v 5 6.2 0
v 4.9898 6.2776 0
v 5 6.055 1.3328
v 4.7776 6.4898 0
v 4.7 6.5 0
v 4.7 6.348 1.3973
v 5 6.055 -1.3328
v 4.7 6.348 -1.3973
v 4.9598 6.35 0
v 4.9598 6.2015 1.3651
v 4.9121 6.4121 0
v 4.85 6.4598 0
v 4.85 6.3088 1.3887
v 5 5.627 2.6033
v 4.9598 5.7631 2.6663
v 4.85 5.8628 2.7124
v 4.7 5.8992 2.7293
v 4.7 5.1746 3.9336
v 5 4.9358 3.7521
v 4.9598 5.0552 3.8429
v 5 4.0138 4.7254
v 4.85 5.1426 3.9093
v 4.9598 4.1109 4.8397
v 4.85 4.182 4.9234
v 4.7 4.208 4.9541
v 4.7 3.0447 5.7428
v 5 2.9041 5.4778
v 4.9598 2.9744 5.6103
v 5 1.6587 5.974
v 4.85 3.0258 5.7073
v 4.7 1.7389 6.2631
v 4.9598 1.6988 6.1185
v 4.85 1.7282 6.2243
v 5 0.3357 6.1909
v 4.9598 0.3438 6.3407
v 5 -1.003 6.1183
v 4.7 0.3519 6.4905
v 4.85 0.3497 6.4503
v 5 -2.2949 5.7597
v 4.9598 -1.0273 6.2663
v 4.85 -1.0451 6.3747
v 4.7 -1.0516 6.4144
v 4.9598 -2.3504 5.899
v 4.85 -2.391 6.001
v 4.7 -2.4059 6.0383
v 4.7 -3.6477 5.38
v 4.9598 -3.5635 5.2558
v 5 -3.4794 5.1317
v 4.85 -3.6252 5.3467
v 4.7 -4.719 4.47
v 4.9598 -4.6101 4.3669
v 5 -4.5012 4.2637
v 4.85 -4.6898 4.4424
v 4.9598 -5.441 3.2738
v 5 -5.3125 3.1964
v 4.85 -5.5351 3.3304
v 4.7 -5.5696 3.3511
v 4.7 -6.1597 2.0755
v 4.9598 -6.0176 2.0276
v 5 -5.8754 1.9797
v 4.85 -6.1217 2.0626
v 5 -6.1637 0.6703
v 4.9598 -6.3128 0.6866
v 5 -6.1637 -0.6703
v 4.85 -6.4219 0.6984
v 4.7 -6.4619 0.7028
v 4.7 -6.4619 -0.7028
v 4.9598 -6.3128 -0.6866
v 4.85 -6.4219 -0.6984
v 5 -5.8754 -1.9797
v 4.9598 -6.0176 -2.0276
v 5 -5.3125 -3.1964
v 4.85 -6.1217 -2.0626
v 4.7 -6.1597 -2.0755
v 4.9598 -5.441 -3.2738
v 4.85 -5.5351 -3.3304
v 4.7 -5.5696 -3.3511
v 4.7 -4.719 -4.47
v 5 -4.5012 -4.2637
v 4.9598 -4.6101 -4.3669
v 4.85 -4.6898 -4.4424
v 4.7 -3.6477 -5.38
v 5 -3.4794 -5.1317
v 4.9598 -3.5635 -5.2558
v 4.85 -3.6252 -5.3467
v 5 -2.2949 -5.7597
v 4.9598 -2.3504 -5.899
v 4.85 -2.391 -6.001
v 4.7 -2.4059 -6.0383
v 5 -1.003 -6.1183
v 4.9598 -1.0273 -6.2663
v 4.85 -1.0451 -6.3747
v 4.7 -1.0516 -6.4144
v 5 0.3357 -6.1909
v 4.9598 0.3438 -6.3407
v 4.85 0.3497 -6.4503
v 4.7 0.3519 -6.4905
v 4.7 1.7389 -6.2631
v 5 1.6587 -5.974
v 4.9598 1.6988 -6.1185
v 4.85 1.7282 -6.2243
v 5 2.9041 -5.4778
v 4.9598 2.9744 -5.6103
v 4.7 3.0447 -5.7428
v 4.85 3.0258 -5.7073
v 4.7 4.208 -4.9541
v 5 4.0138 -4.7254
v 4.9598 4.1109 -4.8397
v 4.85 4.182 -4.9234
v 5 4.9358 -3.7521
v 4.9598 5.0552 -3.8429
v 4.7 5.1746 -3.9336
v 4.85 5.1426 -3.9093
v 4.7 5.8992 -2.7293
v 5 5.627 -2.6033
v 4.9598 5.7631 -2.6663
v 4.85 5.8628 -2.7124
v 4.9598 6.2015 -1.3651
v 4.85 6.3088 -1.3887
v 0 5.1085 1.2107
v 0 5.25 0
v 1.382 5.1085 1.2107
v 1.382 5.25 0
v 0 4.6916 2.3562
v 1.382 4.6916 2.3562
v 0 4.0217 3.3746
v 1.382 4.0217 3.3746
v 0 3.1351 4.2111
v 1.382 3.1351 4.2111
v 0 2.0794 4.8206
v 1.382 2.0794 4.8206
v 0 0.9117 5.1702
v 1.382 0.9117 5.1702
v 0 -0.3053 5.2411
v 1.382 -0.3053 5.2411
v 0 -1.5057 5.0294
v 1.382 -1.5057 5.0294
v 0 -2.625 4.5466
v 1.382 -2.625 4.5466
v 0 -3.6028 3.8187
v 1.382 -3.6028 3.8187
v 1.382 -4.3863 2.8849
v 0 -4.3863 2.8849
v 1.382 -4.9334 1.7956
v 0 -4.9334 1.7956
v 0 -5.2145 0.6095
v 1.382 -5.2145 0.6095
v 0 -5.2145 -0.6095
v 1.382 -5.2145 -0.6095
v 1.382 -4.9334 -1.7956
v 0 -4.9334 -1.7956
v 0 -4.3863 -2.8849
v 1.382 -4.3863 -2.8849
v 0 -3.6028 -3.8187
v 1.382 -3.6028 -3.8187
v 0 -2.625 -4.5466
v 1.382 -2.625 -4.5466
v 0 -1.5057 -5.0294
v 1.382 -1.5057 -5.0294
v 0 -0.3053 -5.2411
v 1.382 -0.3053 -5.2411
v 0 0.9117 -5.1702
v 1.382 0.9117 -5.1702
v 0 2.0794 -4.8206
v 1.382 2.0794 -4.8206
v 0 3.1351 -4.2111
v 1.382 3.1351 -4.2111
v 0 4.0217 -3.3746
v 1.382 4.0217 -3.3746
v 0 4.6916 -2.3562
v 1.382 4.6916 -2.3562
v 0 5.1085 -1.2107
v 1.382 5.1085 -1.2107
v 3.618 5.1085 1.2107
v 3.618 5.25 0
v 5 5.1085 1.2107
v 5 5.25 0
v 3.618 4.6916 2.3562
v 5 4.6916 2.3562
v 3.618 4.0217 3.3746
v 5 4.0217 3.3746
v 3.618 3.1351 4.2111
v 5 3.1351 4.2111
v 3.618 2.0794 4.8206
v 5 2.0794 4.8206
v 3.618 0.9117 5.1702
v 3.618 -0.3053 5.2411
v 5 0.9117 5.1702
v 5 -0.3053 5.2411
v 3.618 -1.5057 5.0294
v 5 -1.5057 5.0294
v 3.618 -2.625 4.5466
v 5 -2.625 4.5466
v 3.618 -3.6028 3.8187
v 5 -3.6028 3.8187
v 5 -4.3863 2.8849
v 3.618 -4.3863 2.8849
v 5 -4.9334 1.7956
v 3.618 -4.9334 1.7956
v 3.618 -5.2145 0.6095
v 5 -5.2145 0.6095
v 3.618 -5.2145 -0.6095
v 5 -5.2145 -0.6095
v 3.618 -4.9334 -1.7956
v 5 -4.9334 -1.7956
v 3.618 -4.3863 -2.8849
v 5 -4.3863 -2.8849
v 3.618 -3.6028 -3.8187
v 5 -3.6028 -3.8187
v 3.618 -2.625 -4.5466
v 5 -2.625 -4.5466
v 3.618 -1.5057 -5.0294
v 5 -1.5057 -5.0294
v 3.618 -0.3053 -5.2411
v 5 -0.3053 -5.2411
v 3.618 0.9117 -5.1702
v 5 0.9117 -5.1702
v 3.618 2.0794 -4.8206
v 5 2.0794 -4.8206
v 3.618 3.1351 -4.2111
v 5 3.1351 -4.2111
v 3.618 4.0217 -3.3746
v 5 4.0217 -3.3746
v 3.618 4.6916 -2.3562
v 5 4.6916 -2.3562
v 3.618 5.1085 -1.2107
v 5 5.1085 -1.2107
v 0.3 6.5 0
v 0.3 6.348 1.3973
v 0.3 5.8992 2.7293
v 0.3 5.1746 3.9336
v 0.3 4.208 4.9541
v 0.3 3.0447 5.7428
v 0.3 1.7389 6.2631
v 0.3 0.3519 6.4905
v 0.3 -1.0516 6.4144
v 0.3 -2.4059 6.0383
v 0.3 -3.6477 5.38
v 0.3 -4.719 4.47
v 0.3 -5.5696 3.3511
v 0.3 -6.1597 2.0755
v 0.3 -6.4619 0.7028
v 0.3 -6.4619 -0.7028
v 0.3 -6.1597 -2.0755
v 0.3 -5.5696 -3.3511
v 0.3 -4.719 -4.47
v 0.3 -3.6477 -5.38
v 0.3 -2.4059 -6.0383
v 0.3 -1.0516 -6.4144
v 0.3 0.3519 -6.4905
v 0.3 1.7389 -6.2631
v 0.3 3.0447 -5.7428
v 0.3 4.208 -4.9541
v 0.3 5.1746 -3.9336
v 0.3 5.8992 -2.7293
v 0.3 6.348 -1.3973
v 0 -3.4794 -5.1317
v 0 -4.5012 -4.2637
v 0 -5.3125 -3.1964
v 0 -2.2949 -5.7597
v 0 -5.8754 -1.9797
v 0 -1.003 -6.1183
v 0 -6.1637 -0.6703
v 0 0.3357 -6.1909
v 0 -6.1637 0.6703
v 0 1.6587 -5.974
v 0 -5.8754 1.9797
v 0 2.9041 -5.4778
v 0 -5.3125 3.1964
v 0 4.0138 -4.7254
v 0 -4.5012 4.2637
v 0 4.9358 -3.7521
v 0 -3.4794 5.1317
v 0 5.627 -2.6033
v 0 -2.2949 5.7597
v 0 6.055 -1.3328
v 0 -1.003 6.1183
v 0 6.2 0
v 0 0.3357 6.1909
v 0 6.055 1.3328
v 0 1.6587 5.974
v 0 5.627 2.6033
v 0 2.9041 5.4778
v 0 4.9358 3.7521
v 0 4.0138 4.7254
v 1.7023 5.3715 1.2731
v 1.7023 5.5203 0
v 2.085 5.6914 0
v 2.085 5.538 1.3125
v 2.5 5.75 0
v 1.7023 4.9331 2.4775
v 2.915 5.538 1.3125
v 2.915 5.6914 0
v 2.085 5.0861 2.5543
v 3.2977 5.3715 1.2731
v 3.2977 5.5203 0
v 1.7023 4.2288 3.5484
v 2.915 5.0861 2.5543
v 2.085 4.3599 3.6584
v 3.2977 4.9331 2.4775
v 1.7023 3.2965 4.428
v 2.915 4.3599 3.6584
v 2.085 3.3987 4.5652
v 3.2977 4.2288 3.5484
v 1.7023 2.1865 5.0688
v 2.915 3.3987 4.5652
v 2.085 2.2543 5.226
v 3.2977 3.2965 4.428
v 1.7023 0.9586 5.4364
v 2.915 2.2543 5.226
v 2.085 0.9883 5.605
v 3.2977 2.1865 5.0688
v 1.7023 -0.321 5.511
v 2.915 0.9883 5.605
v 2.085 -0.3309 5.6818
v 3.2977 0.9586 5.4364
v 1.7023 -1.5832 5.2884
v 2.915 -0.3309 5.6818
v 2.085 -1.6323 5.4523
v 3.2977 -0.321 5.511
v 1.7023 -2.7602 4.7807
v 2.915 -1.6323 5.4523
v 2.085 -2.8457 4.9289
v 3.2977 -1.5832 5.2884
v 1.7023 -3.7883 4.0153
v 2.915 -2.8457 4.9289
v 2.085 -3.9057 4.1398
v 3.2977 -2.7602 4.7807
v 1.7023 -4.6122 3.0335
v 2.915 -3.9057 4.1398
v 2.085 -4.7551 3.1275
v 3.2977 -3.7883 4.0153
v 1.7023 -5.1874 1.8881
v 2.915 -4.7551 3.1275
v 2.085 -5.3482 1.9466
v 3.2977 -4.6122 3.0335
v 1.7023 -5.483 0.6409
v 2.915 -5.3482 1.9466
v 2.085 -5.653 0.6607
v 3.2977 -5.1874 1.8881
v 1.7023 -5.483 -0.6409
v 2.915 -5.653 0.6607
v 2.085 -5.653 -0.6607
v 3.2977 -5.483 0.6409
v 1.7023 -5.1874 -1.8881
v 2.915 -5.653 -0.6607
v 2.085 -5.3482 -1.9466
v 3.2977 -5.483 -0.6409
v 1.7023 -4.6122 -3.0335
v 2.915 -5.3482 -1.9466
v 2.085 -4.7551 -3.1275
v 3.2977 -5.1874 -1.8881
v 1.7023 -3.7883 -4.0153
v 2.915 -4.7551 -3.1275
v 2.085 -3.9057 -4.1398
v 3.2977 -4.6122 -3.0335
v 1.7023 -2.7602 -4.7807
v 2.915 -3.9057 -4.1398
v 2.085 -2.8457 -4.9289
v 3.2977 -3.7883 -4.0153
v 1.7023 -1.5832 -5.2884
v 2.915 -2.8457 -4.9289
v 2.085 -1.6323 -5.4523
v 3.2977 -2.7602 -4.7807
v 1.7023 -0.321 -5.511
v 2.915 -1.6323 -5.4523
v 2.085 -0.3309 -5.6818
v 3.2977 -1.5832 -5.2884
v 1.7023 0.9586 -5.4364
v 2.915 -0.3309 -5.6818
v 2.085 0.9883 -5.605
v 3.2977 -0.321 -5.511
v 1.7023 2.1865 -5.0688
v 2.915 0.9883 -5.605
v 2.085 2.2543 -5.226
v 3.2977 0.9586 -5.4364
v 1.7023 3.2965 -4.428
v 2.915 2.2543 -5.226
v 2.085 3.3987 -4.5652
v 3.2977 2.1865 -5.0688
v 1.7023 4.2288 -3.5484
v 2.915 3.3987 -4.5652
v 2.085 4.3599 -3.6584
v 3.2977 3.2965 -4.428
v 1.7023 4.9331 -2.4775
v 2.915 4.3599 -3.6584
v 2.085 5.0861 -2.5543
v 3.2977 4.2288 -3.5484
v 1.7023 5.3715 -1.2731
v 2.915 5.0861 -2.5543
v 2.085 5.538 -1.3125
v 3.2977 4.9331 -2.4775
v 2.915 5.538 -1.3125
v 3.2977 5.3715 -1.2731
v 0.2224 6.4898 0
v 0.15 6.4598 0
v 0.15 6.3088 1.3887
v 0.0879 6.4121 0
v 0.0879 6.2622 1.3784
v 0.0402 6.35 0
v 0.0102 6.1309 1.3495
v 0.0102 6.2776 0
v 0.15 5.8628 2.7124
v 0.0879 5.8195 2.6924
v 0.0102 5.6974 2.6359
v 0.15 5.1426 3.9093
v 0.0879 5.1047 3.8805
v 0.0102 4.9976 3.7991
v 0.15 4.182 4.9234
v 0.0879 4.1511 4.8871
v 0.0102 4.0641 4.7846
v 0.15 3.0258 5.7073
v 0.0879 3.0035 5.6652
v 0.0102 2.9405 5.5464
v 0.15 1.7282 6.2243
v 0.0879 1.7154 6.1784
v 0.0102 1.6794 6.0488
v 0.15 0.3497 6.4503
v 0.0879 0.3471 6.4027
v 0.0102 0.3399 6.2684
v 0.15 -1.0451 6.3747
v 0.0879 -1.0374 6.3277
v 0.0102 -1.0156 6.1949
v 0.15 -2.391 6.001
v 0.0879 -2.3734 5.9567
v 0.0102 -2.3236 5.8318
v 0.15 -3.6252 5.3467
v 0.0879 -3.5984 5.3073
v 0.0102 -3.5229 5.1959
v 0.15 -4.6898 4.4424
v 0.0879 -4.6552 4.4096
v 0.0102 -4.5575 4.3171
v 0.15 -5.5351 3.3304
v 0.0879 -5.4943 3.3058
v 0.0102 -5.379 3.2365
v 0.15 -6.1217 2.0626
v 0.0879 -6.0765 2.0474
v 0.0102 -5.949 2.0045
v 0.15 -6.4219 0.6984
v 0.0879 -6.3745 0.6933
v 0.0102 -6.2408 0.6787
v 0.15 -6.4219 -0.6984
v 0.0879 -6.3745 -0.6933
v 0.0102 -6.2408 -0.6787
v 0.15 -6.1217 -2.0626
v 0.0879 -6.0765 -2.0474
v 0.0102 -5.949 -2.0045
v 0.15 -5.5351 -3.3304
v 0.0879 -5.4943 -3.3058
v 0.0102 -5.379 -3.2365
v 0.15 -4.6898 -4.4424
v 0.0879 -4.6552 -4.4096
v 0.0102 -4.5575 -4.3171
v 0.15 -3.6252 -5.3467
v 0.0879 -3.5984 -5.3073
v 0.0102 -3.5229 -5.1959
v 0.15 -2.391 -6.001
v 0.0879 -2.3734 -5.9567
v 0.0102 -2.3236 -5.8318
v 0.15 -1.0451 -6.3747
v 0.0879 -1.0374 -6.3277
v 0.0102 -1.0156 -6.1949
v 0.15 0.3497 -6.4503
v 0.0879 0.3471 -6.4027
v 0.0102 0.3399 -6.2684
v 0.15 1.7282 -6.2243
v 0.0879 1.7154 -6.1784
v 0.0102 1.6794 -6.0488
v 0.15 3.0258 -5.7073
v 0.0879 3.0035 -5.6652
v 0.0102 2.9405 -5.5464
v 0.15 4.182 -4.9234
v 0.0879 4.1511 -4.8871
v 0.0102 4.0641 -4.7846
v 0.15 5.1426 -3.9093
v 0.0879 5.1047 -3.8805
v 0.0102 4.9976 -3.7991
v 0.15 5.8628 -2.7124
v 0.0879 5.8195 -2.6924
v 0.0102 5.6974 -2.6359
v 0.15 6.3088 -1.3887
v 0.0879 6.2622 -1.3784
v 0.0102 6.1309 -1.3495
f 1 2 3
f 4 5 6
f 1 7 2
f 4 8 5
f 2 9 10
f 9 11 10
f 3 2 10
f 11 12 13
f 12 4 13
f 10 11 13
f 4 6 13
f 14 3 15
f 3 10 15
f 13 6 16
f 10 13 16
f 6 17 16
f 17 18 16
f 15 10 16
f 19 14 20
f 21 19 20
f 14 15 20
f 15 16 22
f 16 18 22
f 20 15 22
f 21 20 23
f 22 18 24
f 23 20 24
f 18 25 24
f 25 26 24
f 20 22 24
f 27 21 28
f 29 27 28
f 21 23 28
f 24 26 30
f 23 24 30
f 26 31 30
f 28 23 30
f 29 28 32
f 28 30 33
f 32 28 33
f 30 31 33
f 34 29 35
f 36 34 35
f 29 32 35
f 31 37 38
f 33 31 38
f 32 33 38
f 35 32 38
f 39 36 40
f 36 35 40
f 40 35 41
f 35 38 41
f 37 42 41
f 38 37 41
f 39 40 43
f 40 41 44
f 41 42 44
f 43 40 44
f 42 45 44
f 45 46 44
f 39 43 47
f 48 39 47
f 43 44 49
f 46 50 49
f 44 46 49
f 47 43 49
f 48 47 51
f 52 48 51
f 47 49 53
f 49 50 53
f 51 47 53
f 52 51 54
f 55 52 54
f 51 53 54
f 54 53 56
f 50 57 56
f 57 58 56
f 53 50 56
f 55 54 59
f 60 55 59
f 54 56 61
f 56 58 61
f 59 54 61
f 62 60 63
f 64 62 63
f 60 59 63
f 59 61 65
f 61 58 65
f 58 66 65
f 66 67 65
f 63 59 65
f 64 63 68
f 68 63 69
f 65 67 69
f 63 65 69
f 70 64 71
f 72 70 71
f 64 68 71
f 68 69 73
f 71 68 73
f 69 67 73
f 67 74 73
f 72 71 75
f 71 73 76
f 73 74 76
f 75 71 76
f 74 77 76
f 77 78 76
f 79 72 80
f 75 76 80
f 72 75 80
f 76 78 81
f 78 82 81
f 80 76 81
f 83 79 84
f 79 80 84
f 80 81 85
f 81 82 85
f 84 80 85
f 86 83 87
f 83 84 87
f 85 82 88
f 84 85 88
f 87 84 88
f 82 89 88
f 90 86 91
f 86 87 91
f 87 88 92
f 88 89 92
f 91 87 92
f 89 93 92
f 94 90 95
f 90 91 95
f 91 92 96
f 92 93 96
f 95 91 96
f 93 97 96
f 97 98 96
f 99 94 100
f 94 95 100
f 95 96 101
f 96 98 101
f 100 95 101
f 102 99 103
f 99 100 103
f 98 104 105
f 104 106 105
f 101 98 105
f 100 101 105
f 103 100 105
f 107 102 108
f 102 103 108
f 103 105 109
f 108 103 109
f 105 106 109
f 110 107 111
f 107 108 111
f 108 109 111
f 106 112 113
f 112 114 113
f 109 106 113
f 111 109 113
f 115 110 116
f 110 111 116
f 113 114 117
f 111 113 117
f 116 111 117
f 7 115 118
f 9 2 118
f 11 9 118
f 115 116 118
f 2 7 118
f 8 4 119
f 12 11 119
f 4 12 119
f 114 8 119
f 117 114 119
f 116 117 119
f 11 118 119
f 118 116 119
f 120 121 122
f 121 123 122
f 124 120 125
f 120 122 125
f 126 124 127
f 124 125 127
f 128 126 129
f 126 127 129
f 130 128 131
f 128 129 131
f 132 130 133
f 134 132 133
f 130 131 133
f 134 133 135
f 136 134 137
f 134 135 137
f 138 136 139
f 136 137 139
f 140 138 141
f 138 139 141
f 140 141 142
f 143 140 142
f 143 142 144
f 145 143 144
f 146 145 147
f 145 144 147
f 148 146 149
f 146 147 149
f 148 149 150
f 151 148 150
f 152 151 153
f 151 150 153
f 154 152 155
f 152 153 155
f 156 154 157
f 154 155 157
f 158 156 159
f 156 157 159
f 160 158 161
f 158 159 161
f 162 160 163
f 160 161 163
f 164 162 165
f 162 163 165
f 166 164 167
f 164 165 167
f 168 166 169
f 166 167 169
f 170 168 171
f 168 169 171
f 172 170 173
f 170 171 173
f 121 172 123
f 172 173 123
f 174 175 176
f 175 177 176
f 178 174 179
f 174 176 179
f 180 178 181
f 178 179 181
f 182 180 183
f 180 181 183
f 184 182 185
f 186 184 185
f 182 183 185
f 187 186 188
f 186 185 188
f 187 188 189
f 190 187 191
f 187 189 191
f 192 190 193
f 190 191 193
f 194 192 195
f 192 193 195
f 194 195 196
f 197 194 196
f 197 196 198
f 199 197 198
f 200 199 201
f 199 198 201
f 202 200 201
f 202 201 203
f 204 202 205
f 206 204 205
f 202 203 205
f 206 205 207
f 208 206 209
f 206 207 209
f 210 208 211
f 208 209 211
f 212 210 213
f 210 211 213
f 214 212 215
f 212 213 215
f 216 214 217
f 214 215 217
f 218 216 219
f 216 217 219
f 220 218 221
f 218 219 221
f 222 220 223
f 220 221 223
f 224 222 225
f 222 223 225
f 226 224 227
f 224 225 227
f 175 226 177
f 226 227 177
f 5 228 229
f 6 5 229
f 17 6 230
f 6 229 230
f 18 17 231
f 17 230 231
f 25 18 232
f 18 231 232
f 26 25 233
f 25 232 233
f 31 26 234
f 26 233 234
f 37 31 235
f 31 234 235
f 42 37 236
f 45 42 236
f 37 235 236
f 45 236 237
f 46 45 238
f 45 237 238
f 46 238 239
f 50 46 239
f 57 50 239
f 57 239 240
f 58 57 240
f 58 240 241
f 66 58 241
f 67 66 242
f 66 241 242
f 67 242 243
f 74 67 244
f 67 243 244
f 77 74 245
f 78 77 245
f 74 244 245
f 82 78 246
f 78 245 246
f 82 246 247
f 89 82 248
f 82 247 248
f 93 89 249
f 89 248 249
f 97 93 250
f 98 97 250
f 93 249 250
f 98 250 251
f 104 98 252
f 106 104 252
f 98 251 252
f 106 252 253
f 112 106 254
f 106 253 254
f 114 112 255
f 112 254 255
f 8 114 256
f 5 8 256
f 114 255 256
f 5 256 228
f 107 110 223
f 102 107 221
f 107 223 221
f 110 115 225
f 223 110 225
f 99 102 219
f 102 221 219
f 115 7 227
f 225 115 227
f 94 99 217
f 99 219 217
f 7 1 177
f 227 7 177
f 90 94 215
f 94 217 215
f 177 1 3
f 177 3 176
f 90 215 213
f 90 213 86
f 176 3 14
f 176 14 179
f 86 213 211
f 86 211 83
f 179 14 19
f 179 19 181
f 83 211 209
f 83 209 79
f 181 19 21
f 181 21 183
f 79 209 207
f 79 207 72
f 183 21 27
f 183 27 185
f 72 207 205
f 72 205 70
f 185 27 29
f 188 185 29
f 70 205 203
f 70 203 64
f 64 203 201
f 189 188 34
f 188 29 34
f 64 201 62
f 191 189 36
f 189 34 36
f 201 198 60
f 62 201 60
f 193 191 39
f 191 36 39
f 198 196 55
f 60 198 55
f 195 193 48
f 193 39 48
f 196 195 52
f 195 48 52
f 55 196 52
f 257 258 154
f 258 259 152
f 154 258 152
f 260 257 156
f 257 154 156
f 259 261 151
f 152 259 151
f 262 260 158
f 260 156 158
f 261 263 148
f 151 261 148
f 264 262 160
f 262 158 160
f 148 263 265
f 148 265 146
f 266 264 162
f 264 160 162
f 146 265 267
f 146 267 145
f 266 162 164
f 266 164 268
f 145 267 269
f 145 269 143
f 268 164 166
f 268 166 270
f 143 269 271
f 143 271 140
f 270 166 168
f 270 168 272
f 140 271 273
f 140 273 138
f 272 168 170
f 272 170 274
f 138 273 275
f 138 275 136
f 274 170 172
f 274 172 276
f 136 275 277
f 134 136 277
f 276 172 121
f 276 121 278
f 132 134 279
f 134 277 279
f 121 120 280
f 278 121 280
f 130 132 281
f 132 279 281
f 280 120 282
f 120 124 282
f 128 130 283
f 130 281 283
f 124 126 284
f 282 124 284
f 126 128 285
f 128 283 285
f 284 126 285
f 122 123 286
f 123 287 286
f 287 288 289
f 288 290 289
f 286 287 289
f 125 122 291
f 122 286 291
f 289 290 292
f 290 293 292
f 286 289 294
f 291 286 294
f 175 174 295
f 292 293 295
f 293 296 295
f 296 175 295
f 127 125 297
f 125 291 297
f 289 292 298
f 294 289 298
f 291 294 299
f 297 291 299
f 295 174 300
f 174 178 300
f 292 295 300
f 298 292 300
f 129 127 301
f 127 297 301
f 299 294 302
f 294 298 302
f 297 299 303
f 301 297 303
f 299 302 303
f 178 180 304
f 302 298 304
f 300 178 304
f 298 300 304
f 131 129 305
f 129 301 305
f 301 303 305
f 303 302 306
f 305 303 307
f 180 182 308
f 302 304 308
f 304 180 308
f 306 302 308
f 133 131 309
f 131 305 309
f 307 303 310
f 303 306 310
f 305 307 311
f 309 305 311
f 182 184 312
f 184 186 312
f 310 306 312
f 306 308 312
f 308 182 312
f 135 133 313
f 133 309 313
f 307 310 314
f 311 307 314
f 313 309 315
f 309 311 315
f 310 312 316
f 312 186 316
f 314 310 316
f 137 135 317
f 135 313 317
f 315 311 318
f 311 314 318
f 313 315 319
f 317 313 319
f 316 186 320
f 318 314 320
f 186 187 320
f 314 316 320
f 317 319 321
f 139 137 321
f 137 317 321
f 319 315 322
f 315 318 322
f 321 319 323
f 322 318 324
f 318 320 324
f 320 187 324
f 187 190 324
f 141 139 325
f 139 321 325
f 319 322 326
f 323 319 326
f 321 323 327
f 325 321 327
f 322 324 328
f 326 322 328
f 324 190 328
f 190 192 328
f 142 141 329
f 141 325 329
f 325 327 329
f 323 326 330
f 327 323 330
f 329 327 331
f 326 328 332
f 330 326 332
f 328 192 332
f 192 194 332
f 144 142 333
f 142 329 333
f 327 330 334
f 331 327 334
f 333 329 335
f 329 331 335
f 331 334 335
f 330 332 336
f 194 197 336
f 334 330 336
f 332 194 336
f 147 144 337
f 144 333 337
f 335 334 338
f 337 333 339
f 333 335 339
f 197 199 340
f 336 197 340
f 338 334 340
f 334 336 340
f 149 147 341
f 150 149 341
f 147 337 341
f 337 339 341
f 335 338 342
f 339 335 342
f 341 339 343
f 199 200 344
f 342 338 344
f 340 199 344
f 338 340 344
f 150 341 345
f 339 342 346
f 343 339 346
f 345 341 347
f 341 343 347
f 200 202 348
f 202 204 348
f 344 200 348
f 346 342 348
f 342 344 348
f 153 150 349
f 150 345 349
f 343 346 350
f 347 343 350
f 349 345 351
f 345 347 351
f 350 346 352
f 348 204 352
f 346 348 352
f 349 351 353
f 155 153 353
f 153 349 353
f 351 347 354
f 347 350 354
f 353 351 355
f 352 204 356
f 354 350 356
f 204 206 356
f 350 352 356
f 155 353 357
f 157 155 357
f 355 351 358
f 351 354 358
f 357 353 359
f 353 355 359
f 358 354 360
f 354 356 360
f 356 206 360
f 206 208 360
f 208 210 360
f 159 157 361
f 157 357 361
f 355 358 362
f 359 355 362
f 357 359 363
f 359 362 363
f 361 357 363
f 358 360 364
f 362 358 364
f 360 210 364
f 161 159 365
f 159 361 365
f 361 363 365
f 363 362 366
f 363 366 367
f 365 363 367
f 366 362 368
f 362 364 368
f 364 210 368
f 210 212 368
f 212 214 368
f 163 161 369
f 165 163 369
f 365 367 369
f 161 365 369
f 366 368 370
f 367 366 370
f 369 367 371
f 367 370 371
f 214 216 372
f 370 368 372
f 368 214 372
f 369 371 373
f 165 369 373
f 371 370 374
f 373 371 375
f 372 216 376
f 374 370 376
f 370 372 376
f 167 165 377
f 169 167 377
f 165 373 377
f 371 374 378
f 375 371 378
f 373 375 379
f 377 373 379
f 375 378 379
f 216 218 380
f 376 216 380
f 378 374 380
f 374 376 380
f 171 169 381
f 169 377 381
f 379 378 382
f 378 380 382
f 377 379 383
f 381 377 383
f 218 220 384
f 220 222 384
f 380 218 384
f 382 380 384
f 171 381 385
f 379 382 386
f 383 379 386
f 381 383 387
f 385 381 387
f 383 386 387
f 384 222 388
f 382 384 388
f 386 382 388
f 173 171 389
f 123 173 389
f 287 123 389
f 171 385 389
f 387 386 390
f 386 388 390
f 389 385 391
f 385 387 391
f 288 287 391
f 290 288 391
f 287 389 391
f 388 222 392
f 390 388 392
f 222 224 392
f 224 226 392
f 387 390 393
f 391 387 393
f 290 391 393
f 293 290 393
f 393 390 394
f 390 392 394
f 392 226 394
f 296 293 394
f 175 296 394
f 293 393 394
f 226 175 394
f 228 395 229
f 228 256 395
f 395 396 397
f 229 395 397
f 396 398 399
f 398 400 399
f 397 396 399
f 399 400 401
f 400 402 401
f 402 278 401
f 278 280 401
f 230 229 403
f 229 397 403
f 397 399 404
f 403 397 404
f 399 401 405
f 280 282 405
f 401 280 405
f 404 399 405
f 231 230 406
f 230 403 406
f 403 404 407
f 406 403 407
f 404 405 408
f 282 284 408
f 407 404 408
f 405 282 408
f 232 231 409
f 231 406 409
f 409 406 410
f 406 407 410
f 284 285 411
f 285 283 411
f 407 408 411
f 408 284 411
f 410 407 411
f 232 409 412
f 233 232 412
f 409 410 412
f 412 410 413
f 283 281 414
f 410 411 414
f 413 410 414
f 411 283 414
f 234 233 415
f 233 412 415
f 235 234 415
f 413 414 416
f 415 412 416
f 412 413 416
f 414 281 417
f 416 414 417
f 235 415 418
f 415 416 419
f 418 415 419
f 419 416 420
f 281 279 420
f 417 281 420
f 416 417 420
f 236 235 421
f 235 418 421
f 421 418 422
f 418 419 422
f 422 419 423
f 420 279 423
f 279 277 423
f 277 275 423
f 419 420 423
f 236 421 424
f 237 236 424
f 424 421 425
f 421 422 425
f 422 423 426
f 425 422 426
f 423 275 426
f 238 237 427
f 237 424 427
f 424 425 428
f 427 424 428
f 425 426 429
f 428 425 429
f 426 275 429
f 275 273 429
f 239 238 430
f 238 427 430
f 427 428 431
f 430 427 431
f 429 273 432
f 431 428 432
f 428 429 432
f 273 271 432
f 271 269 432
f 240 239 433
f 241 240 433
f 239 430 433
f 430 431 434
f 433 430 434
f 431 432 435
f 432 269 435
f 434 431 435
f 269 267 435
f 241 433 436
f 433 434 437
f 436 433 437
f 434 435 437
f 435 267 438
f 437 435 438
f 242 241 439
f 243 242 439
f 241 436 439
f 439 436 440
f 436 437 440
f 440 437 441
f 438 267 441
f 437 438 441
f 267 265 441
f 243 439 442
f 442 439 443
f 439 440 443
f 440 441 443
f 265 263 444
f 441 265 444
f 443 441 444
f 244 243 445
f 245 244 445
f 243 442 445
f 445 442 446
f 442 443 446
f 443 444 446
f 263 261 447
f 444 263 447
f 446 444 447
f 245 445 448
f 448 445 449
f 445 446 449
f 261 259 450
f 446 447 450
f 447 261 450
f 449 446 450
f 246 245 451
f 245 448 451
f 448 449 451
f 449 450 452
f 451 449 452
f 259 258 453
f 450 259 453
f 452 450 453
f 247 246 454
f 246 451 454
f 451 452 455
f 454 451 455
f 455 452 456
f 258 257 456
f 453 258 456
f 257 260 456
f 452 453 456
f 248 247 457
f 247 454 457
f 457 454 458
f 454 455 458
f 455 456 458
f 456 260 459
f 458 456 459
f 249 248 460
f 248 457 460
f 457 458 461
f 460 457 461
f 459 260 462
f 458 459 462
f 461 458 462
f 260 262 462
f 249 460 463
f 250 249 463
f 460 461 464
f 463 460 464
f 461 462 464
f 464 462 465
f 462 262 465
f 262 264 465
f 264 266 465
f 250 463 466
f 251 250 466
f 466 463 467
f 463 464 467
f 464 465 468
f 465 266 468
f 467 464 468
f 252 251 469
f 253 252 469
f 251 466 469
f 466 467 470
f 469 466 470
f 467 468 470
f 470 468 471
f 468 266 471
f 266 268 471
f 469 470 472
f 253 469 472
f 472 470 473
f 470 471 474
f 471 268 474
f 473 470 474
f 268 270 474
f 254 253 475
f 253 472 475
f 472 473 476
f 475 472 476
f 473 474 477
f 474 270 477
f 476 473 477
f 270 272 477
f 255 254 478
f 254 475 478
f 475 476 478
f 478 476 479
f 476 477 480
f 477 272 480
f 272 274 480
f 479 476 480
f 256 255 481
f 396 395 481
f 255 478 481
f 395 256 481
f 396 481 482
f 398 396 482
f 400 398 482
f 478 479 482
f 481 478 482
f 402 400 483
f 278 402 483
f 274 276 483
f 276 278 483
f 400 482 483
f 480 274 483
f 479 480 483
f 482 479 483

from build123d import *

# Parameters (mm, degrees)
CONG_1_R = 0.3


with BuildPart() as part:
    # Esquisse1 → Base-Révolution (revolve)
    with BuildSketch(Plane.XY):
        with BuildLine():
            Line((0, 5.25), (1.381966011, 5.25))
            ThreePointArc((1.381966011, 5.25), (2.5, 5.75), (3.618033989, 5.25))
            Line((3.618033989, 5.25), (5, 5.25))
            Line((5, 5.25), (5, 6.5))
            Line((5, 6.5), (0, 6.5))
            Line((0, 6.5), (0, 5.25))
        make_face()
    revolve(axis=Axis((0, 0, 0), (1, 0, 0)))

    # Congé1
    cong_1_edges = [part.edges().sort_by_distance(p)[0] for p in [
        (5, -6.5, 0),
        (0, -6.5, 0),
    ]]
    fillet(cong_1_edges, radius=CONG_1_R)


solid = part.part
